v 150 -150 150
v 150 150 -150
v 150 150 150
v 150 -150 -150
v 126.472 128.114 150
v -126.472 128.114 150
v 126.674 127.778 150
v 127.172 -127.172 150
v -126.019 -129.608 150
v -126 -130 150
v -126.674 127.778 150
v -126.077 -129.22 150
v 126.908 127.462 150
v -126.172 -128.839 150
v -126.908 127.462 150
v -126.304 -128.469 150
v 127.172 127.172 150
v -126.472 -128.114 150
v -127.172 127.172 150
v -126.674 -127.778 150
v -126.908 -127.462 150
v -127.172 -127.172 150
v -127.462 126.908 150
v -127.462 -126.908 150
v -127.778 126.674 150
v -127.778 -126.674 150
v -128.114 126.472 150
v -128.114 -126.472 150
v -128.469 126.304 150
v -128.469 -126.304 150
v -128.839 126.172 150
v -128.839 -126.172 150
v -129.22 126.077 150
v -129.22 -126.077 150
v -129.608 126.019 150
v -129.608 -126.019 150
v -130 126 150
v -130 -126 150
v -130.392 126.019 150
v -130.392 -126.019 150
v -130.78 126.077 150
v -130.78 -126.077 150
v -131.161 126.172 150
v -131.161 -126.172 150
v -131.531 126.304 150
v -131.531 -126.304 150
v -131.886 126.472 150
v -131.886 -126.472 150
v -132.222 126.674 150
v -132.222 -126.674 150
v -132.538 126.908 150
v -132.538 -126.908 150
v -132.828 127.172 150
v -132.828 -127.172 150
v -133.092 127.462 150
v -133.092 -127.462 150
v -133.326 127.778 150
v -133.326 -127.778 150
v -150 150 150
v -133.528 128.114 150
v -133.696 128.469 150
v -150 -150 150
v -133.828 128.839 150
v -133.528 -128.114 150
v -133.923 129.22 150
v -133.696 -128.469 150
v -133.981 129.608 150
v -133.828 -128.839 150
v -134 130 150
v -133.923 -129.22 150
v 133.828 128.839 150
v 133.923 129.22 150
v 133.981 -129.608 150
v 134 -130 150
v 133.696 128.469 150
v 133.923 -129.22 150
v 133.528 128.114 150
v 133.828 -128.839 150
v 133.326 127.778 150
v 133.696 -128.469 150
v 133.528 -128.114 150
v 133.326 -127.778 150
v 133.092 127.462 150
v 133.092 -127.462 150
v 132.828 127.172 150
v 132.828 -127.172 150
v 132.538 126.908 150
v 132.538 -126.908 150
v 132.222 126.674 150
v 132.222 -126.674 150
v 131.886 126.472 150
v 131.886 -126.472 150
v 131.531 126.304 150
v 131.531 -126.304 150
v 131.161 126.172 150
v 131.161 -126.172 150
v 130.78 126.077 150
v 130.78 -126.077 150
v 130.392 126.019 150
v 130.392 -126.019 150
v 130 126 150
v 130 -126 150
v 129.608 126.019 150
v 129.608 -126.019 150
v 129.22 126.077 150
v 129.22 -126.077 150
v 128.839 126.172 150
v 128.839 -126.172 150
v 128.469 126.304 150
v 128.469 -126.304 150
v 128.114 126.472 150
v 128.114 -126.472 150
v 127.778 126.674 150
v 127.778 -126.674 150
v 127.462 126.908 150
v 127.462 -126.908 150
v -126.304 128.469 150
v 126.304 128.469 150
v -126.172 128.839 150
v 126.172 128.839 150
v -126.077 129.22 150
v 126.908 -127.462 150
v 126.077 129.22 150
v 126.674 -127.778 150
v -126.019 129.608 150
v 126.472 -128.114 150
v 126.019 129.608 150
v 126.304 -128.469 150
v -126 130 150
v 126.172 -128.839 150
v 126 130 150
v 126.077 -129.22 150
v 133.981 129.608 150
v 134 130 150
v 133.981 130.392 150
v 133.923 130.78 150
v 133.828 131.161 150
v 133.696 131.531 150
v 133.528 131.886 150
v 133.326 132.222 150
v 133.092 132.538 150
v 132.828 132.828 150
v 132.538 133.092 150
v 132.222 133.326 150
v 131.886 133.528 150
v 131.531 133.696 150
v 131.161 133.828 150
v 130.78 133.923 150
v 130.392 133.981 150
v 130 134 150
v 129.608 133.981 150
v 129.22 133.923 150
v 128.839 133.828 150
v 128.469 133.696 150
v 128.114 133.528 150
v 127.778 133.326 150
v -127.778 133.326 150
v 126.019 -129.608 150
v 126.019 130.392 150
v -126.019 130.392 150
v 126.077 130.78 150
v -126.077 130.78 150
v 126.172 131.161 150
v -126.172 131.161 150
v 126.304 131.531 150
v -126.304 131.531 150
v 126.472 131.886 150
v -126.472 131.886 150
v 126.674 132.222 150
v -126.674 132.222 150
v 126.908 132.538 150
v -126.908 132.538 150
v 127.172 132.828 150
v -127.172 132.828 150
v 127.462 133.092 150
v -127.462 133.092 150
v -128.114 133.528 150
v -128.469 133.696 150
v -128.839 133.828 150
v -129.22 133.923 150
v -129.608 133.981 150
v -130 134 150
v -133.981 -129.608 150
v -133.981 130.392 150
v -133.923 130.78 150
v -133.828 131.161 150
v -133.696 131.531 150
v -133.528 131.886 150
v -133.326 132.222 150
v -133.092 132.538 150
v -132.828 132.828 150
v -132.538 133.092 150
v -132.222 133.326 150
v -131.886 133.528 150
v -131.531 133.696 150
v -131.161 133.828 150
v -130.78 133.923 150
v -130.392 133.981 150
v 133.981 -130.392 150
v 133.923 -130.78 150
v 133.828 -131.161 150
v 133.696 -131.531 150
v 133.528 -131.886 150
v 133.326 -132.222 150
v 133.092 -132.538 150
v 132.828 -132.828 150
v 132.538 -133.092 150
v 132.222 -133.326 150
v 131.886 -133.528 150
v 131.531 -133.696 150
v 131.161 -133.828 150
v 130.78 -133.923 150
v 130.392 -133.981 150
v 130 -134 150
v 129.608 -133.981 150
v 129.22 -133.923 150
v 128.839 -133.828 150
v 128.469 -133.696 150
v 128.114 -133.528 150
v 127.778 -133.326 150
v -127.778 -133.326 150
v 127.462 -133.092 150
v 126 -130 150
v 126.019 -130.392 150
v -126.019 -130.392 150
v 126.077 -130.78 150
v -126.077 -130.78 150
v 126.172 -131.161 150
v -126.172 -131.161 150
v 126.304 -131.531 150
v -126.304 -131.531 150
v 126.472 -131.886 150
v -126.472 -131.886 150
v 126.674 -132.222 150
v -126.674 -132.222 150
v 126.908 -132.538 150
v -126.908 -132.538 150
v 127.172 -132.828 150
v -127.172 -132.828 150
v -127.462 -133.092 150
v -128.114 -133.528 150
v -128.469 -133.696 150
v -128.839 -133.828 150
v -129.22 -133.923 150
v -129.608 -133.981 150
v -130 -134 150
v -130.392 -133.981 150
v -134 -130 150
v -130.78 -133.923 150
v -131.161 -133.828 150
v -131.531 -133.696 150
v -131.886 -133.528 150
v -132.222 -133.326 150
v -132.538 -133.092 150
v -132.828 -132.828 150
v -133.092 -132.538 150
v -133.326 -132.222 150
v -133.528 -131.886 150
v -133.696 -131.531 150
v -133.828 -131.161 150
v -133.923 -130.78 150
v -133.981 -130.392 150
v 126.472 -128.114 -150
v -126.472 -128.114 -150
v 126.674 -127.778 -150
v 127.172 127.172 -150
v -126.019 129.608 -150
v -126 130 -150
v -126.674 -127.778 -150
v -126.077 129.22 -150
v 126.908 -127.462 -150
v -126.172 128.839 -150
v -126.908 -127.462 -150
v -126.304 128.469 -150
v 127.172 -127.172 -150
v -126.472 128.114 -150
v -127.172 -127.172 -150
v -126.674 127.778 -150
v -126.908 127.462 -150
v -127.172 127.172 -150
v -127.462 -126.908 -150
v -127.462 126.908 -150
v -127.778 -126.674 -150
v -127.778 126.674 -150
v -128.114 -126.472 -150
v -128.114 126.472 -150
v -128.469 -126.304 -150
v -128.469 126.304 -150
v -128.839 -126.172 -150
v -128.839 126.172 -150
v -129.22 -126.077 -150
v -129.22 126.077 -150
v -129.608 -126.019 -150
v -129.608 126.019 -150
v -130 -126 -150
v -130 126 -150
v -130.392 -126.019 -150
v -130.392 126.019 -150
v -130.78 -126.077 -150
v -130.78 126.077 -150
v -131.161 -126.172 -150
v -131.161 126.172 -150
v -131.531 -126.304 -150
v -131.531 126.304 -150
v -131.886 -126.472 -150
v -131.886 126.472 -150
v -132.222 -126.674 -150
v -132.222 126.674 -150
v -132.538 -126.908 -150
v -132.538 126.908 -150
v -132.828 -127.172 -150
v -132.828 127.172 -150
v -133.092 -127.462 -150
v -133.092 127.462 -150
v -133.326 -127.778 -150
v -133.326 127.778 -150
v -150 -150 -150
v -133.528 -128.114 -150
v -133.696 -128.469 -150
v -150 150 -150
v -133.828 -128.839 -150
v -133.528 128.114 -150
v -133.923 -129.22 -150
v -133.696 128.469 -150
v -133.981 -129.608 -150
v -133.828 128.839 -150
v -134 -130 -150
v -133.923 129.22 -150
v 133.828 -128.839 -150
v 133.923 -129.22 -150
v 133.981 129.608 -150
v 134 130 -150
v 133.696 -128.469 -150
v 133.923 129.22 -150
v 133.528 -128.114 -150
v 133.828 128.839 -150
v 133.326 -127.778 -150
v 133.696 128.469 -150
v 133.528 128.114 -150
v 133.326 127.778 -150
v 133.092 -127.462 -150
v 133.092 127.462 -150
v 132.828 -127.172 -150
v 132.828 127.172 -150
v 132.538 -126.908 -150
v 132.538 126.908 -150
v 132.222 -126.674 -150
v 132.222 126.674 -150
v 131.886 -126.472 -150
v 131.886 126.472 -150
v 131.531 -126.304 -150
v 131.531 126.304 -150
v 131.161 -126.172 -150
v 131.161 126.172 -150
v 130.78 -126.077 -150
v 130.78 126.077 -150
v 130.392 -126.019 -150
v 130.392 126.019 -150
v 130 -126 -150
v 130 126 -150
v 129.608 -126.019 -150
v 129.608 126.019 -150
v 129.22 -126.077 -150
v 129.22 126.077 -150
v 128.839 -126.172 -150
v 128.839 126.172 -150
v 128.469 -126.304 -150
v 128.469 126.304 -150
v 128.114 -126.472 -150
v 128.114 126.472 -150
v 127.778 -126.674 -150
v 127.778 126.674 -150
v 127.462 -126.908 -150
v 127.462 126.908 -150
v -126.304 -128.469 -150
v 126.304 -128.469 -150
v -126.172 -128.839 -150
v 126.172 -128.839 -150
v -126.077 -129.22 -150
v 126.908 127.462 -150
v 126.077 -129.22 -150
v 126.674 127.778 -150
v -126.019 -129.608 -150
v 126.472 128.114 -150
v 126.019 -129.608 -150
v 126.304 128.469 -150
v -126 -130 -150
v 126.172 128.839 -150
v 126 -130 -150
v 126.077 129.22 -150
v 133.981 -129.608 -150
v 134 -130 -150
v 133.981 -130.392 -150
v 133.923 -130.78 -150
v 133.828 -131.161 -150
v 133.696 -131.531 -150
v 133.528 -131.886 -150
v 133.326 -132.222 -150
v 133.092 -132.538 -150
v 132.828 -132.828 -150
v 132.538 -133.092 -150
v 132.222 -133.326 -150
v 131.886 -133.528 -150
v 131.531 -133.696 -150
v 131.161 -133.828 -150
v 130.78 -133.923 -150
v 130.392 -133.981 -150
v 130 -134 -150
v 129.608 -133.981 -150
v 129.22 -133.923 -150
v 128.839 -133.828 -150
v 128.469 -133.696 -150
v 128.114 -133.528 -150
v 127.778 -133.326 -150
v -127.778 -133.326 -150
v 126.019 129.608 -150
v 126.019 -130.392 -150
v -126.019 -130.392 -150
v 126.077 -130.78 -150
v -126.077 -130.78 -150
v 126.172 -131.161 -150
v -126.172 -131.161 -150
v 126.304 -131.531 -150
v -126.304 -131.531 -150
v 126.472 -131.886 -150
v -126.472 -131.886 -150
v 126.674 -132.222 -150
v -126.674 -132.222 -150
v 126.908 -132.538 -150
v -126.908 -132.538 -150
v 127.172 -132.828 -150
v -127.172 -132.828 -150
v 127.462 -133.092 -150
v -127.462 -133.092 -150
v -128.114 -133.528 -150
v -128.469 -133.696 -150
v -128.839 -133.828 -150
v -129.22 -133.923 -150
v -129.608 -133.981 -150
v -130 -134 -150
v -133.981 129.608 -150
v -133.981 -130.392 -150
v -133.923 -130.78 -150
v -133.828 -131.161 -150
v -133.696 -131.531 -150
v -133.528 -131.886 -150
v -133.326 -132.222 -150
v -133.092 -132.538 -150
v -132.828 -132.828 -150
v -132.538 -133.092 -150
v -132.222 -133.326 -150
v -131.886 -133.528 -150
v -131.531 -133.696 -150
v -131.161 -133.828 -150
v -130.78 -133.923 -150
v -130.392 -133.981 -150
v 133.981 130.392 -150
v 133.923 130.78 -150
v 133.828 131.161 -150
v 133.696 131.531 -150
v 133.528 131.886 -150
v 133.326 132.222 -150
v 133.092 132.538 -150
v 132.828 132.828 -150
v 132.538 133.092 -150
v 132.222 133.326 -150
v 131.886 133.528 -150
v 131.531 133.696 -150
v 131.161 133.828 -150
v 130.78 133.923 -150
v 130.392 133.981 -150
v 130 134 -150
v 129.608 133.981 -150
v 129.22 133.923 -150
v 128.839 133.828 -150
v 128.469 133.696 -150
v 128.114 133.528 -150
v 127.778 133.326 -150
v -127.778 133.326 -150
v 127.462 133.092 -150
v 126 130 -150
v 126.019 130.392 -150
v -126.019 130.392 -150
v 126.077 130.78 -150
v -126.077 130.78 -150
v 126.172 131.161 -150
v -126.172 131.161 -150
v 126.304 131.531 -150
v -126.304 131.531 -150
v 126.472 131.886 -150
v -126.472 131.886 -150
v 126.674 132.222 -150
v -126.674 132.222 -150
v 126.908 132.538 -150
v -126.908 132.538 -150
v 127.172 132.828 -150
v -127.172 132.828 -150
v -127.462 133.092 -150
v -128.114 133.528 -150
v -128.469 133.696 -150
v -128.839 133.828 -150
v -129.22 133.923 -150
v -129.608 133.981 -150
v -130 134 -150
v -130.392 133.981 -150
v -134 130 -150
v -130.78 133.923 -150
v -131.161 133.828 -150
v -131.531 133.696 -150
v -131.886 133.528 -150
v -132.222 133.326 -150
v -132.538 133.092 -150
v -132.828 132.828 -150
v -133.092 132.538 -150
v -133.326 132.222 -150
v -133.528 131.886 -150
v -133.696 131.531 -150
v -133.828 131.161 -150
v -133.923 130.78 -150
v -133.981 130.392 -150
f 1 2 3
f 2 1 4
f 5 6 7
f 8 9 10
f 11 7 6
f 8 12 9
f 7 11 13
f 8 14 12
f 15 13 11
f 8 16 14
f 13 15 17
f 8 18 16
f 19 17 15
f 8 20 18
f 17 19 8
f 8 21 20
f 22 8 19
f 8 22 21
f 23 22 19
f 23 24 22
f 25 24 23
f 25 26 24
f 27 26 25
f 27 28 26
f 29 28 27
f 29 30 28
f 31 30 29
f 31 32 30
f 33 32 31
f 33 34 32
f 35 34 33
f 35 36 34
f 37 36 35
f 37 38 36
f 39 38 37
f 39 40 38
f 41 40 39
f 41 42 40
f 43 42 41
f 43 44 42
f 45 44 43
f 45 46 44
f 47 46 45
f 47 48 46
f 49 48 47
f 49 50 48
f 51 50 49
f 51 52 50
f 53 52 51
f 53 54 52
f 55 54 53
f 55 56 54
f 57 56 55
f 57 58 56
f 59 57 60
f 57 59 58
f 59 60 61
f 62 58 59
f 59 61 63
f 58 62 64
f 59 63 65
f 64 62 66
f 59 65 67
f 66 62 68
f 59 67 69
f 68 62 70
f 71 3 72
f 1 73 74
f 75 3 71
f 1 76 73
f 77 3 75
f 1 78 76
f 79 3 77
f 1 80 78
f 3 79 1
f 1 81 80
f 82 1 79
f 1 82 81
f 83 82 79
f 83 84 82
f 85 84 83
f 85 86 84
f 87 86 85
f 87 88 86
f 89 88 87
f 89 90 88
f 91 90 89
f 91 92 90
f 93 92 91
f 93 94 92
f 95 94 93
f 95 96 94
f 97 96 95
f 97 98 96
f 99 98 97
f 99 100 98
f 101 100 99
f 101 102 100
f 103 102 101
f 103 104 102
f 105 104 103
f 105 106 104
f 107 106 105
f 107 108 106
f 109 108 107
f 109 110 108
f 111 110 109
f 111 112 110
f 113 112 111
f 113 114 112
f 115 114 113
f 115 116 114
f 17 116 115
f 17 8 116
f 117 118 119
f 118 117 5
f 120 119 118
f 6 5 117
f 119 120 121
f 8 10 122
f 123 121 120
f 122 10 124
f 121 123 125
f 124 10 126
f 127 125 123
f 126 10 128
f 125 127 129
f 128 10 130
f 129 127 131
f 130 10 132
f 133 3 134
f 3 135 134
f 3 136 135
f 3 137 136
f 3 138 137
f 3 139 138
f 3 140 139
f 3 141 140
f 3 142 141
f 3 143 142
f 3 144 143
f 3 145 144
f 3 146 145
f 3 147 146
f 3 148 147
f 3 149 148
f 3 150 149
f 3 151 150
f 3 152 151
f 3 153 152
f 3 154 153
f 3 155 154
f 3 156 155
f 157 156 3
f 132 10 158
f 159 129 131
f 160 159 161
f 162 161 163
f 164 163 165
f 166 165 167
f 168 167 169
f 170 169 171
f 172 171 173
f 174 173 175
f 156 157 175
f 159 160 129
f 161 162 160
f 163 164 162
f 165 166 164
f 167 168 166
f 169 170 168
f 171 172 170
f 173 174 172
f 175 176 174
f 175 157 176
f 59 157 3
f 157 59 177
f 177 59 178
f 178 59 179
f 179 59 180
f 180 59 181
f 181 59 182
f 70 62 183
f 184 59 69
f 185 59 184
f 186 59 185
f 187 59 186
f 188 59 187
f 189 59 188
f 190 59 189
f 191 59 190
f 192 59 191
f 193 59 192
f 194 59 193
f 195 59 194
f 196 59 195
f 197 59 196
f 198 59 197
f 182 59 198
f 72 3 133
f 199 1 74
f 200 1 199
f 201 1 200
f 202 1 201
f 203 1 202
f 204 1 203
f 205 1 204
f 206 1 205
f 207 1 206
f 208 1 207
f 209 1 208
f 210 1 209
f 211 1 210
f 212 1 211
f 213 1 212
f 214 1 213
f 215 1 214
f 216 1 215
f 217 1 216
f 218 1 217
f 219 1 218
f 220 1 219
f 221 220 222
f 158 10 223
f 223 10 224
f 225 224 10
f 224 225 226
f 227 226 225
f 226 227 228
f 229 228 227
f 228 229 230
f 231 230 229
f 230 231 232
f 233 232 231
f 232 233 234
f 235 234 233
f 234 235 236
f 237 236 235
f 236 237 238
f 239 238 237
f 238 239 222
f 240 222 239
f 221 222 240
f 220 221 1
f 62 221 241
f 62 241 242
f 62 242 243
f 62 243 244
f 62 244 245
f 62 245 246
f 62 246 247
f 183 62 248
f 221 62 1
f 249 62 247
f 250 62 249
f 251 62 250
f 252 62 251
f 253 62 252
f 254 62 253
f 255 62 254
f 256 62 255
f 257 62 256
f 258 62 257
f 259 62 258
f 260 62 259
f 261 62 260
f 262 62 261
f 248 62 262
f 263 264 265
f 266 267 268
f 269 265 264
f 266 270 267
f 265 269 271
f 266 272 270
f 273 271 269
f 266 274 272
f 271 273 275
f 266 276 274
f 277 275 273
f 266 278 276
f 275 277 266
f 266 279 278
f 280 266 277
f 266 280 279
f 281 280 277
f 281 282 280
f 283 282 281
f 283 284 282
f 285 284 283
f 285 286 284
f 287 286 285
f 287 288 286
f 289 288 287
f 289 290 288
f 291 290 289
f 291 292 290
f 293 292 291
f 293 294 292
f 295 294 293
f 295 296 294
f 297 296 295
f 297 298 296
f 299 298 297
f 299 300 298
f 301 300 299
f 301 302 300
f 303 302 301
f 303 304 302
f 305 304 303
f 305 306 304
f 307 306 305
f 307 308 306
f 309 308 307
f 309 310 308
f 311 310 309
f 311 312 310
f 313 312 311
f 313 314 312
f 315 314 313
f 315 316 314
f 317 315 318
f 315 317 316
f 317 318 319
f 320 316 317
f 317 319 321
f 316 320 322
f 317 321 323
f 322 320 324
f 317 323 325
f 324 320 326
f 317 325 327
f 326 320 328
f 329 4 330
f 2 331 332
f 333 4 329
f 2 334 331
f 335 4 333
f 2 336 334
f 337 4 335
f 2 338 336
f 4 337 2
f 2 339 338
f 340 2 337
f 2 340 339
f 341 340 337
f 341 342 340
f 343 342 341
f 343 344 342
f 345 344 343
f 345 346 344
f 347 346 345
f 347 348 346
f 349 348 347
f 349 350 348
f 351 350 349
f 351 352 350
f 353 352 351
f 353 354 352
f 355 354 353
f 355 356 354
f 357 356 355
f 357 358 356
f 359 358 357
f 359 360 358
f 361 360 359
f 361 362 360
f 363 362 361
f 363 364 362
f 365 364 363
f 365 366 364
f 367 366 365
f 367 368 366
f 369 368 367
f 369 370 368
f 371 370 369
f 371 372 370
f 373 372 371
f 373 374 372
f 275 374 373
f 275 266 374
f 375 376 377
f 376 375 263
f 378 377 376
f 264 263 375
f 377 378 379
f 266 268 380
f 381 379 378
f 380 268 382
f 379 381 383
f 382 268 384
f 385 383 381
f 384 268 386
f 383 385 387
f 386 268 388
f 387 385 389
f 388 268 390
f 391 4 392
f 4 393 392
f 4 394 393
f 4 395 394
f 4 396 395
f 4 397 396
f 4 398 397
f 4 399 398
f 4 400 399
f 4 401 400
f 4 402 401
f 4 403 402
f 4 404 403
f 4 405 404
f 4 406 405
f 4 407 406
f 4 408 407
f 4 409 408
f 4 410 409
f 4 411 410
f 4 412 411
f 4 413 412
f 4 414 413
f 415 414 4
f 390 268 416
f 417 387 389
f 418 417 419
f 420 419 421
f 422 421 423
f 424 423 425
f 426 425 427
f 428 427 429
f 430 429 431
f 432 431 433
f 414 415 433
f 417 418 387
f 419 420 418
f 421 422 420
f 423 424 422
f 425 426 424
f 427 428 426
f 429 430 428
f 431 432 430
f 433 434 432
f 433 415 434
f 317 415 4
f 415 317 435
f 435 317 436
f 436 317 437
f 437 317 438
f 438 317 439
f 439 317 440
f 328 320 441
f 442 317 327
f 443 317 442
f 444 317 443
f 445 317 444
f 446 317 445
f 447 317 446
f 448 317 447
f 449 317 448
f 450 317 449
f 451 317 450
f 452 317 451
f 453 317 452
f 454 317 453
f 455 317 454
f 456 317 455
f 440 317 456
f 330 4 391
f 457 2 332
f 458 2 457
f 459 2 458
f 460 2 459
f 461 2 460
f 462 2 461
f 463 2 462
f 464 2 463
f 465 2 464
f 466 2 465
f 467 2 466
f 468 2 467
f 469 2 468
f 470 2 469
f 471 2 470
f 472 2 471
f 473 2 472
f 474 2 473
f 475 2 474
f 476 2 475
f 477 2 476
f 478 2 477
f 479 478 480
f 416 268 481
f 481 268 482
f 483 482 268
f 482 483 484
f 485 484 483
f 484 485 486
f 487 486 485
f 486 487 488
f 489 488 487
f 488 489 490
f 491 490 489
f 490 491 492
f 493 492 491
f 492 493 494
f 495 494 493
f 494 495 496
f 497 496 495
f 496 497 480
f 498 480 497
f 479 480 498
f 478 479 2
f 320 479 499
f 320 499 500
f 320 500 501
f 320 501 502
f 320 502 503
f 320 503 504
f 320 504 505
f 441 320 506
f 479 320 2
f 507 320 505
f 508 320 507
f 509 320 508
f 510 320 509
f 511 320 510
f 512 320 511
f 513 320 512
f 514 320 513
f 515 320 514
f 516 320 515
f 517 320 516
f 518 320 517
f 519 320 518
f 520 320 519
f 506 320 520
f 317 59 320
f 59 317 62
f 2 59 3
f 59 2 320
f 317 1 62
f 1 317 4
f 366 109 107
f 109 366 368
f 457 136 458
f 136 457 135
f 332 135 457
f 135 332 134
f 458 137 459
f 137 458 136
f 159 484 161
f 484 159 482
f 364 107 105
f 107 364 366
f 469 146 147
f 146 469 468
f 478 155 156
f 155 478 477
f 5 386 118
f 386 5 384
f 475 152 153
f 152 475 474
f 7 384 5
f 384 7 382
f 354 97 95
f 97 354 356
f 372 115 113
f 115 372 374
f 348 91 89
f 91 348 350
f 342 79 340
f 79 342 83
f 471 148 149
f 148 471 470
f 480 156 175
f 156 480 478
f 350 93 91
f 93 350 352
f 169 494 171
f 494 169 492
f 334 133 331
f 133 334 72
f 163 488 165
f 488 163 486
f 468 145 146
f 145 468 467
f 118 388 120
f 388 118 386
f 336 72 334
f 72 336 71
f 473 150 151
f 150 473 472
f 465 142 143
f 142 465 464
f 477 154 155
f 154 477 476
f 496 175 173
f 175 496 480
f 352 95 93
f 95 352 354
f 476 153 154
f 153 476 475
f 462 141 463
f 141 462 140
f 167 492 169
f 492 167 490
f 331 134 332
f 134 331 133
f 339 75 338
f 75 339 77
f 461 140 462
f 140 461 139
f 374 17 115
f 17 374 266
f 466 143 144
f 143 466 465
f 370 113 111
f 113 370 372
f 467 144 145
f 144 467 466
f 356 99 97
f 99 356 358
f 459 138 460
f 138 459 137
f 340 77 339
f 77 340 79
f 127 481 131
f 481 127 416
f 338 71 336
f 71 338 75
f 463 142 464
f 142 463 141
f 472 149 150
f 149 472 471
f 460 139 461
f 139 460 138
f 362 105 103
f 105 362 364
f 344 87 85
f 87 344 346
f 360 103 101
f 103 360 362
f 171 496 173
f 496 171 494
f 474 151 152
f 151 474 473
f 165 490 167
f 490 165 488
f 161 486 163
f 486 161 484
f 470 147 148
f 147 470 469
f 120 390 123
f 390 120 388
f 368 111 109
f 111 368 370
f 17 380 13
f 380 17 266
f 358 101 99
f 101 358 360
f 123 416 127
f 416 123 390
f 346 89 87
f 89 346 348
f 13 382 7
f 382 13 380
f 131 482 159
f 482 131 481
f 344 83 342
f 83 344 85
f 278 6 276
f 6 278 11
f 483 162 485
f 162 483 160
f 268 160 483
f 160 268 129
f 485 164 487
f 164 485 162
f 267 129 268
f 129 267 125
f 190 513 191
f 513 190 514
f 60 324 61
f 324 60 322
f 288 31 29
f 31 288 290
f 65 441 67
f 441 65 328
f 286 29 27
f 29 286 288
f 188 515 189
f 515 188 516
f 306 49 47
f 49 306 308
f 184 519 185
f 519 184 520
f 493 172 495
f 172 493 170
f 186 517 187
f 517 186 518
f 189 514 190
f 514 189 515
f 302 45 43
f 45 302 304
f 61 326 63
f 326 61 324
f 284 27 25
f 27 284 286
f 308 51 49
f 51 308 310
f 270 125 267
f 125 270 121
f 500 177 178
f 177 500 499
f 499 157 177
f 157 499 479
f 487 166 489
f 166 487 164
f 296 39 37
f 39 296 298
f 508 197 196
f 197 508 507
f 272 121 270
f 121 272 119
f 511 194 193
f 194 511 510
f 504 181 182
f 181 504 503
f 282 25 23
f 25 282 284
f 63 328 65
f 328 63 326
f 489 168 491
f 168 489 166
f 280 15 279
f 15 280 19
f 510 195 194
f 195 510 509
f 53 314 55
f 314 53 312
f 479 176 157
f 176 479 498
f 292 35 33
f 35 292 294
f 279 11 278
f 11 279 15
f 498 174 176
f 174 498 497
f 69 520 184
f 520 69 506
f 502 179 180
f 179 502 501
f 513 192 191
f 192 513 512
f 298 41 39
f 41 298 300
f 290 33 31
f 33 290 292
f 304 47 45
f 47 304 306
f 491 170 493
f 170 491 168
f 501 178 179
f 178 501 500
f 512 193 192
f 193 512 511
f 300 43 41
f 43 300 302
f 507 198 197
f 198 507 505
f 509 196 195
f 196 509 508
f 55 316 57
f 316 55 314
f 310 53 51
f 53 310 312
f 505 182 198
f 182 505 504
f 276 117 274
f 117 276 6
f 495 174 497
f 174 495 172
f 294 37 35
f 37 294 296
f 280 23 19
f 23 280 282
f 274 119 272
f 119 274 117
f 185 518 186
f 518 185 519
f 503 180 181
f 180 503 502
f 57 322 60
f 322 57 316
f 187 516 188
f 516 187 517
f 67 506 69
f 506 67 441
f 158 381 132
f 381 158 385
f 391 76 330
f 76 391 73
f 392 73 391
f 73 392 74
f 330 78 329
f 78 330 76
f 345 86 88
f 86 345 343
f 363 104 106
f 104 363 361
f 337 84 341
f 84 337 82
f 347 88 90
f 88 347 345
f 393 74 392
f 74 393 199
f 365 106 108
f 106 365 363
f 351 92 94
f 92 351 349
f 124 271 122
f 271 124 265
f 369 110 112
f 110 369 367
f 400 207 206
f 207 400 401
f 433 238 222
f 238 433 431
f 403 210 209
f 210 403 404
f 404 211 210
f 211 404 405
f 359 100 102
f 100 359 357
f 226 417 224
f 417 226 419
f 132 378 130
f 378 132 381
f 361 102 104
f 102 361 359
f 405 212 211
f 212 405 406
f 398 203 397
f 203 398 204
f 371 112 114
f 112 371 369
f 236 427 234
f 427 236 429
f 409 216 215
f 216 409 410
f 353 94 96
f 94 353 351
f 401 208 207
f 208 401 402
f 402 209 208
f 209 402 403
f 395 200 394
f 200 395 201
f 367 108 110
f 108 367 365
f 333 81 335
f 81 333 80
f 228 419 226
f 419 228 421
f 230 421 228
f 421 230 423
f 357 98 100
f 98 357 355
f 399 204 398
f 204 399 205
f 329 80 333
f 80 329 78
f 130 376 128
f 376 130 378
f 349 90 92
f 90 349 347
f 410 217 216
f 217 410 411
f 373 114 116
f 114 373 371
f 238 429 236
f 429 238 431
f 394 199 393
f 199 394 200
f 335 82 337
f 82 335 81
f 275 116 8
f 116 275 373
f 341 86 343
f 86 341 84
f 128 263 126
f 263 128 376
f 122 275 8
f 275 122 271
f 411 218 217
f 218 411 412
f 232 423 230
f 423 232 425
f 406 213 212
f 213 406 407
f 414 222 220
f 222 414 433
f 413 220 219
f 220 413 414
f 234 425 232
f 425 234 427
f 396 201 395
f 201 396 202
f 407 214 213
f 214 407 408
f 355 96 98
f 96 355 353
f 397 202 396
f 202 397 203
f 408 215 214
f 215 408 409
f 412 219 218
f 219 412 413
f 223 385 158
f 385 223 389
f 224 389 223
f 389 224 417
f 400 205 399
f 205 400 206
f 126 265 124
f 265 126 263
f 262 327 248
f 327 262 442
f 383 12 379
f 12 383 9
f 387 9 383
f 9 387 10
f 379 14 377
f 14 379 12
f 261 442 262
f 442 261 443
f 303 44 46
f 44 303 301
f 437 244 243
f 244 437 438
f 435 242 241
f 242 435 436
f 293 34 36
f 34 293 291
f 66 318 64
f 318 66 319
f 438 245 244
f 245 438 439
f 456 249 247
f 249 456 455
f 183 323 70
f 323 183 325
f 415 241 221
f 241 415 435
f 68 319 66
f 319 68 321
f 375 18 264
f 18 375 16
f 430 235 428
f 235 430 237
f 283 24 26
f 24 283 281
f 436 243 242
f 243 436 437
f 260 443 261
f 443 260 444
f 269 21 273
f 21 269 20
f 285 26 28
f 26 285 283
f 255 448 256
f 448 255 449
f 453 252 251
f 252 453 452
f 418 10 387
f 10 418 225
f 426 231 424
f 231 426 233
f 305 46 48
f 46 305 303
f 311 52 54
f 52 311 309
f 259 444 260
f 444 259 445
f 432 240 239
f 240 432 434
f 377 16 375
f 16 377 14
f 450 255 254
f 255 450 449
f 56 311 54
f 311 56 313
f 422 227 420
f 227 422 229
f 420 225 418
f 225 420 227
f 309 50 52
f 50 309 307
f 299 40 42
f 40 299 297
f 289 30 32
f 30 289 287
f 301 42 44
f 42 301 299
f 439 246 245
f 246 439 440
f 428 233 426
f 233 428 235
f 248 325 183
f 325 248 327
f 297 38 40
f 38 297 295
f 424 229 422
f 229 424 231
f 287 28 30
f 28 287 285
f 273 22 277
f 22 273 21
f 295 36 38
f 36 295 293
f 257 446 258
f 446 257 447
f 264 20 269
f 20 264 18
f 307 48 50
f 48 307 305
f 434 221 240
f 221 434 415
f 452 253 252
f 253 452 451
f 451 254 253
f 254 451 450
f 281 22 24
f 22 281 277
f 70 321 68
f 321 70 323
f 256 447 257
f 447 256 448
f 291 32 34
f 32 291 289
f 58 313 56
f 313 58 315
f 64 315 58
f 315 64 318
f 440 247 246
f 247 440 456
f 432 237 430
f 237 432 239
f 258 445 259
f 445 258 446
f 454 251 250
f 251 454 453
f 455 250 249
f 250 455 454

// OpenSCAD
// Concrete base for seismograph
// 300 x 300 x 300 mm block with 4 corner through-holes

// Parameters (edit as needed)
base_x = 300; // mm
base_y = 300; // mm
base_z = 300; // mm

hole_d = 8;       // hole diameter in mm (default 8 mm)
hole_offset = 20; // distance from each outer edge to hole center (mm)
hole_h = base_z + 10; // hole height to ensure full through-hole

$fn = 64; // cylinder resolution

module concrete_base() {
    difference() {
        // Centered cube
        cube([base_x, base_y, base_z], center=true);

        // Four corner holes (through along Z)
        x_off = (base_x/2) - hole_offset;
        y_off = (base_y/2) - hole_offset;

        translate([ x_off,  y_off, 0])    cylinder(h=hole_h, r=hole_d/2, center=true);
        translate([-x_off,  y_off, 0])    cylinder(h=hole_h, r=hole_d/2, center=true);
        translate([ x_off, -y_off, 0])    cylinder(h=hole_h, r=hole_d/2, center=true);
        translate([-x_off, -y_off,0])    cylinder(h=hole_h, r=hole_d/2, center=true);
    }
}

// Render the base
concrete_base();

// Notes:
// - Hole diameter and offset can be changed above.
// - To export STL: in OpenSCAD: Design -> Compile, then File -> Export -> Export as STL.
